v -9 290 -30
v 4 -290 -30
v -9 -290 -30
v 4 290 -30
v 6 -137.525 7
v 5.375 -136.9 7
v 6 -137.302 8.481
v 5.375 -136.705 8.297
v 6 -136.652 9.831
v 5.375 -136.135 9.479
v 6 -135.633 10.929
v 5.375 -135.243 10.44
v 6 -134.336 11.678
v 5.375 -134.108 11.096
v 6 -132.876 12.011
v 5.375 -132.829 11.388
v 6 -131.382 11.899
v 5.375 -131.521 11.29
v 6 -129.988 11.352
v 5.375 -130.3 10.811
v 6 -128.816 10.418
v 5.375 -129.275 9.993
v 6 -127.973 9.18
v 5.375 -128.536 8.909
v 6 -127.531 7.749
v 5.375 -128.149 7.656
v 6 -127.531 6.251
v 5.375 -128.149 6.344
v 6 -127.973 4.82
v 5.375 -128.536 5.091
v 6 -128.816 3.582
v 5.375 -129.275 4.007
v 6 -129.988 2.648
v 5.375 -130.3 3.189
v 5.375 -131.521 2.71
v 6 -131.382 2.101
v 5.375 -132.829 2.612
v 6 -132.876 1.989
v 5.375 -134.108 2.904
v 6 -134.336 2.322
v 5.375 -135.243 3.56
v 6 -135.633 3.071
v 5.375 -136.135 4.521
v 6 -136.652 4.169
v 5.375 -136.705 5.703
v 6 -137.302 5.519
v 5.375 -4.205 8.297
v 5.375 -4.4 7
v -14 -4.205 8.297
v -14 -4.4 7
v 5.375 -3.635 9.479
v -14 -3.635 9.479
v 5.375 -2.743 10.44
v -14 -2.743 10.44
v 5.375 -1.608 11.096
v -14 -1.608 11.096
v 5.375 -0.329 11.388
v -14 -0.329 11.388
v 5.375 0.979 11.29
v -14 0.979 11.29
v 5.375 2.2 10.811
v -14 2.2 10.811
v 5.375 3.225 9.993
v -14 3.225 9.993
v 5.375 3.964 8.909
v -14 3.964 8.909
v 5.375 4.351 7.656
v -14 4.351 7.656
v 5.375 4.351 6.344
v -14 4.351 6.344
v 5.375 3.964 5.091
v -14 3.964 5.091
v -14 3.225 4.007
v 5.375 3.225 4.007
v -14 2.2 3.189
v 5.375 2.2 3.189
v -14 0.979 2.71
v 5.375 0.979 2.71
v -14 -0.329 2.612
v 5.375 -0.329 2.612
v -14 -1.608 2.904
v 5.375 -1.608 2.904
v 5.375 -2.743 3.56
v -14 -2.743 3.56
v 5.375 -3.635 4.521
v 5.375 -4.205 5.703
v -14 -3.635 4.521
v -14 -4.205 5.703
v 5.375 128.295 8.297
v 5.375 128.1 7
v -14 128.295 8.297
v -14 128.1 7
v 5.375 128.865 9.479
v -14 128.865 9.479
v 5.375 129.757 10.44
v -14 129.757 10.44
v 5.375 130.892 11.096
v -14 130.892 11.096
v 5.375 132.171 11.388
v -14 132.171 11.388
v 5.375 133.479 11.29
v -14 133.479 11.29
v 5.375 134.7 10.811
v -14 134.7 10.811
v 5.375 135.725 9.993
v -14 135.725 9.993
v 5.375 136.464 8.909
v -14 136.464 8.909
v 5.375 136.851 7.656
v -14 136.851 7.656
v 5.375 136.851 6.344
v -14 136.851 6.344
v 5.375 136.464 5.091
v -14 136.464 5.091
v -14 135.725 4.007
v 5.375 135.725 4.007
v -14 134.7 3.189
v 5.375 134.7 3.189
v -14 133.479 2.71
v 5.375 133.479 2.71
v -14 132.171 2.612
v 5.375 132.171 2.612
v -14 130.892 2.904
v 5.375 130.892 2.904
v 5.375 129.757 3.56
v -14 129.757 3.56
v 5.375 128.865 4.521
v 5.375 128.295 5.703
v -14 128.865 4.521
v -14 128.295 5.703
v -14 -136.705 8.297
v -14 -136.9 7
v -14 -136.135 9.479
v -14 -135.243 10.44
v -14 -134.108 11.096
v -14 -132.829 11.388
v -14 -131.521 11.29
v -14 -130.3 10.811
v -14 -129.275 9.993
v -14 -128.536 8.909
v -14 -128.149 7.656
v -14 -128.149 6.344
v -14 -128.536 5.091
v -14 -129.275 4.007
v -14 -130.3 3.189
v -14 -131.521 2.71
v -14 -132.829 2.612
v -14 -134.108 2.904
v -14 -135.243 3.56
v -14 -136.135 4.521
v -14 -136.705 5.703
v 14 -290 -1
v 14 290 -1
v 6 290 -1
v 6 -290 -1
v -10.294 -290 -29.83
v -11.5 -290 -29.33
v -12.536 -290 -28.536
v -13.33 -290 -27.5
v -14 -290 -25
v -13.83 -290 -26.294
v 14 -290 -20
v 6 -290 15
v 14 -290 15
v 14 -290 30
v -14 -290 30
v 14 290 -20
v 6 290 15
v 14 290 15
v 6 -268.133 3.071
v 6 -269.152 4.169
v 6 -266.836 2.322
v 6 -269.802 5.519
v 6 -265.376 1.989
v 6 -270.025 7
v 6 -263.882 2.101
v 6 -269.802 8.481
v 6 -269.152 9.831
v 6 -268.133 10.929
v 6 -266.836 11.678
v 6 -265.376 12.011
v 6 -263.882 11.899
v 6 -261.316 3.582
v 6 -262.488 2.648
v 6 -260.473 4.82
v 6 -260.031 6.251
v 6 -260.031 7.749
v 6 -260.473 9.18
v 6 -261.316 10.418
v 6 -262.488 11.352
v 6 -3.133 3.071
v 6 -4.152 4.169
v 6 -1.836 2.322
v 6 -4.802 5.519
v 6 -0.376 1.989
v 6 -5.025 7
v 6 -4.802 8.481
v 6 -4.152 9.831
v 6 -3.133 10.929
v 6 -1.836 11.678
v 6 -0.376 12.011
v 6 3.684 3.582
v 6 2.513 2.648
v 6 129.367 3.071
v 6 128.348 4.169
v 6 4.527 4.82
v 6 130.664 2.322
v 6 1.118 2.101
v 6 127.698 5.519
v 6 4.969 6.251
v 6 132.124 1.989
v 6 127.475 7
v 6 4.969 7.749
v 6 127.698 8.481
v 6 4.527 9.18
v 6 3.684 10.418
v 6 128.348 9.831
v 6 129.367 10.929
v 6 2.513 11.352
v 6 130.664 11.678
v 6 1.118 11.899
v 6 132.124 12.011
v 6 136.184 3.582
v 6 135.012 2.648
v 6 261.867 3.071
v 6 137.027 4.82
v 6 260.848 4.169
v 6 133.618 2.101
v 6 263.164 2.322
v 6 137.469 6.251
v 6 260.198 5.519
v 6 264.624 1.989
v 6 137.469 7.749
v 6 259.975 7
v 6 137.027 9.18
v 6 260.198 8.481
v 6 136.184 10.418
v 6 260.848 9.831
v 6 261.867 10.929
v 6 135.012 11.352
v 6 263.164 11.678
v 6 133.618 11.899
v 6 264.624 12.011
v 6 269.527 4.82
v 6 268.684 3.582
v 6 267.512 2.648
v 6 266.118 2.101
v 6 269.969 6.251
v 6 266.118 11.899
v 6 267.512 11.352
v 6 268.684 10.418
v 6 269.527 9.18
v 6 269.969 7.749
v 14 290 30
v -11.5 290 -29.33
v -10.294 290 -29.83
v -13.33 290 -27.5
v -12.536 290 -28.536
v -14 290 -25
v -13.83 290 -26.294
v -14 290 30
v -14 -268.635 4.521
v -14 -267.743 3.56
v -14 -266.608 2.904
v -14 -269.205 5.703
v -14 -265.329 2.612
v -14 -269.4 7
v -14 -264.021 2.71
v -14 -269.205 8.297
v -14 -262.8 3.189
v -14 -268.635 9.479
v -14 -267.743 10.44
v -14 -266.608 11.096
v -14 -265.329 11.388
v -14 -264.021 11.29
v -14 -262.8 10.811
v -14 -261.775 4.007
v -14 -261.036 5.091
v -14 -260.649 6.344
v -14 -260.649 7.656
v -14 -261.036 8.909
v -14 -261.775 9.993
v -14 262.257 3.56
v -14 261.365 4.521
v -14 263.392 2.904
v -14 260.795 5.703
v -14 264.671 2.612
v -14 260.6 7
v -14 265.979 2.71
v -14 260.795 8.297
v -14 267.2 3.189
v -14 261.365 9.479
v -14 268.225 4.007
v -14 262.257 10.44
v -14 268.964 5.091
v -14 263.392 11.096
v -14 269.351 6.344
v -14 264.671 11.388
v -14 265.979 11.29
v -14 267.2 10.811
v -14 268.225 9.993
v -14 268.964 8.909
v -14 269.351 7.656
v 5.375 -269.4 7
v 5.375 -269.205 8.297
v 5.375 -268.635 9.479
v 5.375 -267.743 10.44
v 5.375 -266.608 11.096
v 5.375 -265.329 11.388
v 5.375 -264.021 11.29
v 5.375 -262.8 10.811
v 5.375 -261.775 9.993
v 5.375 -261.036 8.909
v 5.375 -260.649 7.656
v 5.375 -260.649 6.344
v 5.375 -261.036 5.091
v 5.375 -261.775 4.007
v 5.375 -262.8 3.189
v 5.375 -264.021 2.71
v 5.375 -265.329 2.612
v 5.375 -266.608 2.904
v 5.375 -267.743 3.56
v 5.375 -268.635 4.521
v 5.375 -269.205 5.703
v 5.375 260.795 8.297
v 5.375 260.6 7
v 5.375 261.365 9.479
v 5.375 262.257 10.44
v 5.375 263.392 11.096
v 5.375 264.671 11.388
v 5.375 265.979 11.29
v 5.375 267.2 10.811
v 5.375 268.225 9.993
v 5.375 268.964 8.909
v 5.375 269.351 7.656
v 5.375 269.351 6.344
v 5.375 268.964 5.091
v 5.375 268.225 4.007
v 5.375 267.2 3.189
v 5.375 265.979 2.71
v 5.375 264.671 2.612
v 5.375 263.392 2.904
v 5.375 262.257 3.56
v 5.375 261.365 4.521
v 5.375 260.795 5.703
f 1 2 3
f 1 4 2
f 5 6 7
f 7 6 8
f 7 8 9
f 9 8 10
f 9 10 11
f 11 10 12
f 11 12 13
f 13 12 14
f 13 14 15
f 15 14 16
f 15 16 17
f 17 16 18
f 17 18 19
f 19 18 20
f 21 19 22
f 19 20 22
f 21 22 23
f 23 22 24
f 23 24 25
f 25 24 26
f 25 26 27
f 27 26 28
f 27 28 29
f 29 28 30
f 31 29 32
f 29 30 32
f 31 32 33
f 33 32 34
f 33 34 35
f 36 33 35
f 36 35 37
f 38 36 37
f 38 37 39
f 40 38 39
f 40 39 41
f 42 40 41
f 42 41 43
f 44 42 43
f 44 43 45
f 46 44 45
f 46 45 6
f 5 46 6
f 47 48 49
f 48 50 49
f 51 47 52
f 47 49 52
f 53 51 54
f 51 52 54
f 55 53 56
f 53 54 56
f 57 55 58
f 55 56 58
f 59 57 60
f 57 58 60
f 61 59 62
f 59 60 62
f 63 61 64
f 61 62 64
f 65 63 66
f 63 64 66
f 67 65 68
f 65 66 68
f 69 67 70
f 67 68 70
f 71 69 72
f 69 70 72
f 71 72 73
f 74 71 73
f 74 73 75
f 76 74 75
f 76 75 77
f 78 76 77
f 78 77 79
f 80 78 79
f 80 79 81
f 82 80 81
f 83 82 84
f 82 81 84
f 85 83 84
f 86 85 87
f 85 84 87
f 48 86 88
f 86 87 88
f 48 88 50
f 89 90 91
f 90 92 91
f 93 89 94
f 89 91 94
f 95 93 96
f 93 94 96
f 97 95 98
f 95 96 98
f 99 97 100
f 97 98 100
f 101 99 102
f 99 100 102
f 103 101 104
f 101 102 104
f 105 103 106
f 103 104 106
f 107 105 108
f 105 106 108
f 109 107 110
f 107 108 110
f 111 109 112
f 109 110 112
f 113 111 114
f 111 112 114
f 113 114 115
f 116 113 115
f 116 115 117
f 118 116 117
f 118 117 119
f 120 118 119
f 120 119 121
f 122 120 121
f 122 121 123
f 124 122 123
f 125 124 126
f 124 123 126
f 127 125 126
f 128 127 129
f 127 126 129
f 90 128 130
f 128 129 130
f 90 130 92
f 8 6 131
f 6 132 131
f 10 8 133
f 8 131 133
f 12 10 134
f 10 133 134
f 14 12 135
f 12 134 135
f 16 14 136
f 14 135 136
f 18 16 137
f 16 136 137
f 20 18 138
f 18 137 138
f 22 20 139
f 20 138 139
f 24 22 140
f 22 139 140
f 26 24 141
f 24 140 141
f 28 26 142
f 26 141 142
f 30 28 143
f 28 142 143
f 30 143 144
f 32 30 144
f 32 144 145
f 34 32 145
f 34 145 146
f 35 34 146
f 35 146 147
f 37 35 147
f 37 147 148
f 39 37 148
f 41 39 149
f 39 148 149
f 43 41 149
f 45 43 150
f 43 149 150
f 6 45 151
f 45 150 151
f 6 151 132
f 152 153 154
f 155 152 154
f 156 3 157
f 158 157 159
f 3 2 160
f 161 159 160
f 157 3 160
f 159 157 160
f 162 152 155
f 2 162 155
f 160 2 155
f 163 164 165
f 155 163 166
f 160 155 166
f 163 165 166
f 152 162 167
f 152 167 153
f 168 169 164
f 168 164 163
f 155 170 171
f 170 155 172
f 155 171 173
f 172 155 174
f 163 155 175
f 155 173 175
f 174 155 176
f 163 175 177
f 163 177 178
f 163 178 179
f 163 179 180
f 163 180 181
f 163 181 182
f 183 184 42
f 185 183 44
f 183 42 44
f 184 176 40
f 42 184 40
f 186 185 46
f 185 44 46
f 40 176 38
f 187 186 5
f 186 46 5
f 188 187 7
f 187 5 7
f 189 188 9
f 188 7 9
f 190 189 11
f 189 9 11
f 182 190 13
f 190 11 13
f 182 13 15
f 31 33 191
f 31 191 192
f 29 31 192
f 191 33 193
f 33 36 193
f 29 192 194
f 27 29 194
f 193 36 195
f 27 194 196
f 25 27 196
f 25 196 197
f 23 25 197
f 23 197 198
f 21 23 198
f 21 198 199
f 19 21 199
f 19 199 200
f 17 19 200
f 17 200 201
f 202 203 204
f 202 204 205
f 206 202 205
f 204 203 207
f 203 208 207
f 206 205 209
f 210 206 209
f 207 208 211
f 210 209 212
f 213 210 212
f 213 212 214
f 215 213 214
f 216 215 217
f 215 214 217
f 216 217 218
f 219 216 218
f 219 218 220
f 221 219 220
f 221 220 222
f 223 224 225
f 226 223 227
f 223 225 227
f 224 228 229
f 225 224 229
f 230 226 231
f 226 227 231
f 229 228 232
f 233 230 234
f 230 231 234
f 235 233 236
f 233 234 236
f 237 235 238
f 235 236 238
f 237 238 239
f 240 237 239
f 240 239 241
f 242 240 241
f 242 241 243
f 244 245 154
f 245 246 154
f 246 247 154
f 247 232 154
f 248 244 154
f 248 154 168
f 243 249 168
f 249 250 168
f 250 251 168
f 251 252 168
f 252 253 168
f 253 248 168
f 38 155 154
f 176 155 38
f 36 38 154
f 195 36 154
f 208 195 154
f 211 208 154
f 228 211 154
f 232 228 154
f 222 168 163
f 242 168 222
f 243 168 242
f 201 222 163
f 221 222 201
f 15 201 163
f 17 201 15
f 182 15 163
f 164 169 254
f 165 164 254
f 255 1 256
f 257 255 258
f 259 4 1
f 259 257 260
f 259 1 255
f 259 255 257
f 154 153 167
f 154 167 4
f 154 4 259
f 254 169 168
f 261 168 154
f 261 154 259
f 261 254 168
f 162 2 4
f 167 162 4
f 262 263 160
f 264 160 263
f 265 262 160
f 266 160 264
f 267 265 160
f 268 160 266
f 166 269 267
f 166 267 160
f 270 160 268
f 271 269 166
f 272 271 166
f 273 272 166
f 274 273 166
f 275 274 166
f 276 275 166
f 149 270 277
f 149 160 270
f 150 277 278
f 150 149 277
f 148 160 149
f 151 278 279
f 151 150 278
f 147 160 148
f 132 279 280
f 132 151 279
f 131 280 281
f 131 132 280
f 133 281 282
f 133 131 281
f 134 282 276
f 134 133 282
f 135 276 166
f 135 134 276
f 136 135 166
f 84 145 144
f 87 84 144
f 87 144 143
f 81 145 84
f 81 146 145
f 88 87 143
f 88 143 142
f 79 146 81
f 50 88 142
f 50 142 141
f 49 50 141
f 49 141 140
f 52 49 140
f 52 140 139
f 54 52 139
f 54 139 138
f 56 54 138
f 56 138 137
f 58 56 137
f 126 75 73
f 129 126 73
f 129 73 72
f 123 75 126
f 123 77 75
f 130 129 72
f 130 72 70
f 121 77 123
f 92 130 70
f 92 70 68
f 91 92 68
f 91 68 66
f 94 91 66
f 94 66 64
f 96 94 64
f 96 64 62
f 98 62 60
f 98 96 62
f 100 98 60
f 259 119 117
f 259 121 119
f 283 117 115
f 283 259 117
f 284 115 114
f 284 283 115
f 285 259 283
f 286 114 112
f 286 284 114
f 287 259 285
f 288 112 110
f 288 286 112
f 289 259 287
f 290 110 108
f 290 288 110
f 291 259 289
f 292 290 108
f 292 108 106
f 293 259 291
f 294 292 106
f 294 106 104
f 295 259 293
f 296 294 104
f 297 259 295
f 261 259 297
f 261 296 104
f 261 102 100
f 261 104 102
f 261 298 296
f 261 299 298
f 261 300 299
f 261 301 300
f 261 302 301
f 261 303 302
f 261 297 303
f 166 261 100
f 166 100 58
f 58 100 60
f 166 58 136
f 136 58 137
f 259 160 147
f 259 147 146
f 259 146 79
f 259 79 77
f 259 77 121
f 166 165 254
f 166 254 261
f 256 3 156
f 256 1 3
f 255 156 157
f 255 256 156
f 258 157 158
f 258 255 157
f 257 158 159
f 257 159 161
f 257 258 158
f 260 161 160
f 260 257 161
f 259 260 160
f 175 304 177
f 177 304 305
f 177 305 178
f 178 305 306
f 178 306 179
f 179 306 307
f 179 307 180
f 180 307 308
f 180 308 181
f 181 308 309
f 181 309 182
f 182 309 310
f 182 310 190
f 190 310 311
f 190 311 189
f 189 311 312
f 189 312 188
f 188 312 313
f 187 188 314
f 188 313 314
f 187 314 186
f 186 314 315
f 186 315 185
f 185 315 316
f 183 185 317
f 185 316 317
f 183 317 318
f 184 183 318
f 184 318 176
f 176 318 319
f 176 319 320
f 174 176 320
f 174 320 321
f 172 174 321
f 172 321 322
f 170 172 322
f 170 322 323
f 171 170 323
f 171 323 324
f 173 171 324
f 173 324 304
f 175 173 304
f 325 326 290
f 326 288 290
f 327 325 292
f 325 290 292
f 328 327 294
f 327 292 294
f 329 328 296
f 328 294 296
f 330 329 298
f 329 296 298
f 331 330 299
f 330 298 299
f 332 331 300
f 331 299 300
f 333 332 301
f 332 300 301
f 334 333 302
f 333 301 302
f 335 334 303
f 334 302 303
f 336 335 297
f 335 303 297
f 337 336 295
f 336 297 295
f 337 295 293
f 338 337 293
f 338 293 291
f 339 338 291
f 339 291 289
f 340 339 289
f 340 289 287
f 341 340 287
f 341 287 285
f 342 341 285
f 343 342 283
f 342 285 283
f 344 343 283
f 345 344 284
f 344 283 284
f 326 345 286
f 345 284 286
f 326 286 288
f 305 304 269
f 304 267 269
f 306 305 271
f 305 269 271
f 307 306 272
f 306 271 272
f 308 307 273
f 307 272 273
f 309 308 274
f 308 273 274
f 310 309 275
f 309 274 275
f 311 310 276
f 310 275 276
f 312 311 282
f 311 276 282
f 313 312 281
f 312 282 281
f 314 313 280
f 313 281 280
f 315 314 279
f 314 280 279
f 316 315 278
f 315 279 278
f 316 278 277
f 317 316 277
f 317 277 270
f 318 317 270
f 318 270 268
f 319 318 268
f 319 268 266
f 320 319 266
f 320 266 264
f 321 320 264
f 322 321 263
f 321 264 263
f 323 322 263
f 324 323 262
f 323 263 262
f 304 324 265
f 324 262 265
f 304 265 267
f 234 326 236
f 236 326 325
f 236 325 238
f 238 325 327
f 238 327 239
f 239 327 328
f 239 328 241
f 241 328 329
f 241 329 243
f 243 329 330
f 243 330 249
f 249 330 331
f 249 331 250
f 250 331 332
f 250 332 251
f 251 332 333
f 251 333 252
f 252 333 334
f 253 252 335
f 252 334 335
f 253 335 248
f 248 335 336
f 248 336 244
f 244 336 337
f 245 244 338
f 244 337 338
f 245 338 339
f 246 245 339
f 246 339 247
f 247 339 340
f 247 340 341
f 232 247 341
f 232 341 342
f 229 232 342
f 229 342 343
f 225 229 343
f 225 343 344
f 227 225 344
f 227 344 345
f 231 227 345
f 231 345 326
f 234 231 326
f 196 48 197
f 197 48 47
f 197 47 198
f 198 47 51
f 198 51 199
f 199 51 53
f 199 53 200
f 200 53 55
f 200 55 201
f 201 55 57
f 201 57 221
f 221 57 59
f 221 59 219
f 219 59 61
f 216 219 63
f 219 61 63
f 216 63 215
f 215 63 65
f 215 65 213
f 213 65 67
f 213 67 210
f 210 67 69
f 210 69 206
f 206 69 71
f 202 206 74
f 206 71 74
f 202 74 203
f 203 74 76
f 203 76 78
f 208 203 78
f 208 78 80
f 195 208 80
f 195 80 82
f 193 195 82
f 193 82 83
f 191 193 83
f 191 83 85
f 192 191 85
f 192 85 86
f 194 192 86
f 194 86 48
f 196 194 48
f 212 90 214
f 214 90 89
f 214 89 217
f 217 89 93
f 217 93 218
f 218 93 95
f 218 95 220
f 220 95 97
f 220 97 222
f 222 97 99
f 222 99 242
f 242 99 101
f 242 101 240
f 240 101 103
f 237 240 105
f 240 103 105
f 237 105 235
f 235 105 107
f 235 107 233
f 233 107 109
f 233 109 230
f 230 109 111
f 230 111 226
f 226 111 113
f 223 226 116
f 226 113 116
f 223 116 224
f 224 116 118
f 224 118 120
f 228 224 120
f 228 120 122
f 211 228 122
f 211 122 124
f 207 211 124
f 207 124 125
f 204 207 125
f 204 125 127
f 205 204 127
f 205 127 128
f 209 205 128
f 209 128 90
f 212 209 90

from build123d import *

# Parameters (mm, degrees)
SKETCH2_W                         = 28
SKETCH2_H                         = 60
BOSS_EXTRUDE1_DEPTH               = 290
SKETCH3_W                         = 8
SKETCH3_H                         = 16
CUT_EXTRUDE1_DEPTH                = 581.944059269
CHAMFER1_SIZE                     = 10
FILLET1_R                         = 5
M10X1_25_TAPPED_HOLE1_D           = 8.8
M10X1_25_TAPPED_HOLE1_CSINK_D     = 10.05
M10X1_25_TAPPED_HOLE1_CSINK_ANGLE = 90
LPATTERN1_COUNT                   = 5
LPATTERN1_PITCH                   = 132.5


with BuildPart() as part:
    # Sketch2 → Boss-Extrude1 (new, symmetric)
    with BuildSketch(Plane(origin=(0, 0, 0), x_dir=(-1, 0, 0), z_dir=(0, 1, 0))):
        Rectangle(SKETCH2_W, SKETCH2_H)
    extrude(amount=BOSS_EXTRUDE1_DEPTH, both=True)

    # Sketch3 → Cut-Extrude1 (cut, through all)
    with BuildSketch(Plane(origin=(0, 290, 0), x_dir=(-1, 0, 0), z_dir=(0, 1, 0))):
        with Locations((-10, 7)):
            Rectangle(SKETCH3_W, SKETCH3_H)
    extrude(amount=-CUT_EXTRUDE1_DEPTH, mode=Mode.SUBTRACT)

    # Chamfer1
    chamfer1_edges = [part.edges().sort_by_distance(p)[0] for p in [
        (14, 0, -30),
    ]]
    chamfer(chamfer1_edges, length=CHAMFER1_SIZE)

    # Fillet1
    fillet1_edges = [part.edges().sort_by_distance(p)[0] for p in [
        (-14, 0, -30),
    ]]
    fillet(fillet1_edges, radius=FILLET1_R)

    # M10x1.25 Tapped Hole1 (through all)
    with Locations(Plane.YZ.offset(6)):
        with Locations((-265, 7)):
            m10x1_25_tapped_hole1 = CounterSinkHole(M10X1_25_TAPPED_HOLE1_D / 2, M10X1_25_TAPPED_HOLE1_CSINK_D / 2, counter_sink_angle=M10X1_25_TAPPED_HOLE1_CSINK_ANGLE)

    # LPattern1: M10x1.25 Tapped Hole1 ×5
    with Locations(*[(0, i * LPATTERN1_PITCH, 0) for i in range(1, LPATTERN1_COUNT)]):
        add(m10x1_25_tapped_hole1, mode=Mode.SUBTRACT)


solid = part.part
